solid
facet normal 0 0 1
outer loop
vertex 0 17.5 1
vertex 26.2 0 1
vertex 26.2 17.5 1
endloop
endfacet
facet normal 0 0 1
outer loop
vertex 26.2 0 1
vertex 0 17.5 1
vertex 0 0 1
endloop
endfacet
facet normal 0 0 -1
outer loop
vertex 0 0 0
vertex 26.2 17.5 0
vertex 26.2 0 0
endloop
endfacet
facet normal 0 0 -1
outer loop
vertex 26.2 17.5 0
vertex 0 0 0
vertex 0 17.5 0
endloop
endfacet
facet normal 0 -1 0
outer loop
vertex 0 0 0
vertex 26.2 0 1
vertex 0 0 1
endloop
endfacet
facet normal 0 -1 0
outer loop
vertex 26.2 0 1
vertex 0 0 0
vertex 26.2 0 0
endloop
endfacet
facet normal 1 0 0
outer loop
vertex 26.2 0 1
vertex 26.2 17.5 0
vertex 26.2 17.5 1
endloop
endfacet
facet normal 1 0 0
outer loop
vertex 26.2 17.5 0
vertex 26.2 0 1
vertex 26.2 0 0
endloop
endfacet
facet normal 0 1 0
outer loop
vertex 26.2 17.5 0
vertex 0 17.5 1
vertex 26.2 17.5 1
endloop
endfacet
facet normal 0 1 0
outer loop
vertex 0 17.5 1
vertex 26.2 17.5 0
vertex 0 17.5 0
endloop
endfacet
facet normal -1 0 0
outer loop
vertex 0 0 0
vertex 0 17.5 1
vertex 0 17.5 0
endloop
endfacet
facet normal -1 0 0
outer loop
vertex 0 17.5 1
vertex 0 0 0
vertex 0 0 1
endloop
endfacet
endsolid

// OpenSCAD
$fn=64;

module battery_charger_module(length=26.2, width=17.5, thickness=1.0) {
    cube([length, width, thickness], center=false);
}

battery_charger_module();
